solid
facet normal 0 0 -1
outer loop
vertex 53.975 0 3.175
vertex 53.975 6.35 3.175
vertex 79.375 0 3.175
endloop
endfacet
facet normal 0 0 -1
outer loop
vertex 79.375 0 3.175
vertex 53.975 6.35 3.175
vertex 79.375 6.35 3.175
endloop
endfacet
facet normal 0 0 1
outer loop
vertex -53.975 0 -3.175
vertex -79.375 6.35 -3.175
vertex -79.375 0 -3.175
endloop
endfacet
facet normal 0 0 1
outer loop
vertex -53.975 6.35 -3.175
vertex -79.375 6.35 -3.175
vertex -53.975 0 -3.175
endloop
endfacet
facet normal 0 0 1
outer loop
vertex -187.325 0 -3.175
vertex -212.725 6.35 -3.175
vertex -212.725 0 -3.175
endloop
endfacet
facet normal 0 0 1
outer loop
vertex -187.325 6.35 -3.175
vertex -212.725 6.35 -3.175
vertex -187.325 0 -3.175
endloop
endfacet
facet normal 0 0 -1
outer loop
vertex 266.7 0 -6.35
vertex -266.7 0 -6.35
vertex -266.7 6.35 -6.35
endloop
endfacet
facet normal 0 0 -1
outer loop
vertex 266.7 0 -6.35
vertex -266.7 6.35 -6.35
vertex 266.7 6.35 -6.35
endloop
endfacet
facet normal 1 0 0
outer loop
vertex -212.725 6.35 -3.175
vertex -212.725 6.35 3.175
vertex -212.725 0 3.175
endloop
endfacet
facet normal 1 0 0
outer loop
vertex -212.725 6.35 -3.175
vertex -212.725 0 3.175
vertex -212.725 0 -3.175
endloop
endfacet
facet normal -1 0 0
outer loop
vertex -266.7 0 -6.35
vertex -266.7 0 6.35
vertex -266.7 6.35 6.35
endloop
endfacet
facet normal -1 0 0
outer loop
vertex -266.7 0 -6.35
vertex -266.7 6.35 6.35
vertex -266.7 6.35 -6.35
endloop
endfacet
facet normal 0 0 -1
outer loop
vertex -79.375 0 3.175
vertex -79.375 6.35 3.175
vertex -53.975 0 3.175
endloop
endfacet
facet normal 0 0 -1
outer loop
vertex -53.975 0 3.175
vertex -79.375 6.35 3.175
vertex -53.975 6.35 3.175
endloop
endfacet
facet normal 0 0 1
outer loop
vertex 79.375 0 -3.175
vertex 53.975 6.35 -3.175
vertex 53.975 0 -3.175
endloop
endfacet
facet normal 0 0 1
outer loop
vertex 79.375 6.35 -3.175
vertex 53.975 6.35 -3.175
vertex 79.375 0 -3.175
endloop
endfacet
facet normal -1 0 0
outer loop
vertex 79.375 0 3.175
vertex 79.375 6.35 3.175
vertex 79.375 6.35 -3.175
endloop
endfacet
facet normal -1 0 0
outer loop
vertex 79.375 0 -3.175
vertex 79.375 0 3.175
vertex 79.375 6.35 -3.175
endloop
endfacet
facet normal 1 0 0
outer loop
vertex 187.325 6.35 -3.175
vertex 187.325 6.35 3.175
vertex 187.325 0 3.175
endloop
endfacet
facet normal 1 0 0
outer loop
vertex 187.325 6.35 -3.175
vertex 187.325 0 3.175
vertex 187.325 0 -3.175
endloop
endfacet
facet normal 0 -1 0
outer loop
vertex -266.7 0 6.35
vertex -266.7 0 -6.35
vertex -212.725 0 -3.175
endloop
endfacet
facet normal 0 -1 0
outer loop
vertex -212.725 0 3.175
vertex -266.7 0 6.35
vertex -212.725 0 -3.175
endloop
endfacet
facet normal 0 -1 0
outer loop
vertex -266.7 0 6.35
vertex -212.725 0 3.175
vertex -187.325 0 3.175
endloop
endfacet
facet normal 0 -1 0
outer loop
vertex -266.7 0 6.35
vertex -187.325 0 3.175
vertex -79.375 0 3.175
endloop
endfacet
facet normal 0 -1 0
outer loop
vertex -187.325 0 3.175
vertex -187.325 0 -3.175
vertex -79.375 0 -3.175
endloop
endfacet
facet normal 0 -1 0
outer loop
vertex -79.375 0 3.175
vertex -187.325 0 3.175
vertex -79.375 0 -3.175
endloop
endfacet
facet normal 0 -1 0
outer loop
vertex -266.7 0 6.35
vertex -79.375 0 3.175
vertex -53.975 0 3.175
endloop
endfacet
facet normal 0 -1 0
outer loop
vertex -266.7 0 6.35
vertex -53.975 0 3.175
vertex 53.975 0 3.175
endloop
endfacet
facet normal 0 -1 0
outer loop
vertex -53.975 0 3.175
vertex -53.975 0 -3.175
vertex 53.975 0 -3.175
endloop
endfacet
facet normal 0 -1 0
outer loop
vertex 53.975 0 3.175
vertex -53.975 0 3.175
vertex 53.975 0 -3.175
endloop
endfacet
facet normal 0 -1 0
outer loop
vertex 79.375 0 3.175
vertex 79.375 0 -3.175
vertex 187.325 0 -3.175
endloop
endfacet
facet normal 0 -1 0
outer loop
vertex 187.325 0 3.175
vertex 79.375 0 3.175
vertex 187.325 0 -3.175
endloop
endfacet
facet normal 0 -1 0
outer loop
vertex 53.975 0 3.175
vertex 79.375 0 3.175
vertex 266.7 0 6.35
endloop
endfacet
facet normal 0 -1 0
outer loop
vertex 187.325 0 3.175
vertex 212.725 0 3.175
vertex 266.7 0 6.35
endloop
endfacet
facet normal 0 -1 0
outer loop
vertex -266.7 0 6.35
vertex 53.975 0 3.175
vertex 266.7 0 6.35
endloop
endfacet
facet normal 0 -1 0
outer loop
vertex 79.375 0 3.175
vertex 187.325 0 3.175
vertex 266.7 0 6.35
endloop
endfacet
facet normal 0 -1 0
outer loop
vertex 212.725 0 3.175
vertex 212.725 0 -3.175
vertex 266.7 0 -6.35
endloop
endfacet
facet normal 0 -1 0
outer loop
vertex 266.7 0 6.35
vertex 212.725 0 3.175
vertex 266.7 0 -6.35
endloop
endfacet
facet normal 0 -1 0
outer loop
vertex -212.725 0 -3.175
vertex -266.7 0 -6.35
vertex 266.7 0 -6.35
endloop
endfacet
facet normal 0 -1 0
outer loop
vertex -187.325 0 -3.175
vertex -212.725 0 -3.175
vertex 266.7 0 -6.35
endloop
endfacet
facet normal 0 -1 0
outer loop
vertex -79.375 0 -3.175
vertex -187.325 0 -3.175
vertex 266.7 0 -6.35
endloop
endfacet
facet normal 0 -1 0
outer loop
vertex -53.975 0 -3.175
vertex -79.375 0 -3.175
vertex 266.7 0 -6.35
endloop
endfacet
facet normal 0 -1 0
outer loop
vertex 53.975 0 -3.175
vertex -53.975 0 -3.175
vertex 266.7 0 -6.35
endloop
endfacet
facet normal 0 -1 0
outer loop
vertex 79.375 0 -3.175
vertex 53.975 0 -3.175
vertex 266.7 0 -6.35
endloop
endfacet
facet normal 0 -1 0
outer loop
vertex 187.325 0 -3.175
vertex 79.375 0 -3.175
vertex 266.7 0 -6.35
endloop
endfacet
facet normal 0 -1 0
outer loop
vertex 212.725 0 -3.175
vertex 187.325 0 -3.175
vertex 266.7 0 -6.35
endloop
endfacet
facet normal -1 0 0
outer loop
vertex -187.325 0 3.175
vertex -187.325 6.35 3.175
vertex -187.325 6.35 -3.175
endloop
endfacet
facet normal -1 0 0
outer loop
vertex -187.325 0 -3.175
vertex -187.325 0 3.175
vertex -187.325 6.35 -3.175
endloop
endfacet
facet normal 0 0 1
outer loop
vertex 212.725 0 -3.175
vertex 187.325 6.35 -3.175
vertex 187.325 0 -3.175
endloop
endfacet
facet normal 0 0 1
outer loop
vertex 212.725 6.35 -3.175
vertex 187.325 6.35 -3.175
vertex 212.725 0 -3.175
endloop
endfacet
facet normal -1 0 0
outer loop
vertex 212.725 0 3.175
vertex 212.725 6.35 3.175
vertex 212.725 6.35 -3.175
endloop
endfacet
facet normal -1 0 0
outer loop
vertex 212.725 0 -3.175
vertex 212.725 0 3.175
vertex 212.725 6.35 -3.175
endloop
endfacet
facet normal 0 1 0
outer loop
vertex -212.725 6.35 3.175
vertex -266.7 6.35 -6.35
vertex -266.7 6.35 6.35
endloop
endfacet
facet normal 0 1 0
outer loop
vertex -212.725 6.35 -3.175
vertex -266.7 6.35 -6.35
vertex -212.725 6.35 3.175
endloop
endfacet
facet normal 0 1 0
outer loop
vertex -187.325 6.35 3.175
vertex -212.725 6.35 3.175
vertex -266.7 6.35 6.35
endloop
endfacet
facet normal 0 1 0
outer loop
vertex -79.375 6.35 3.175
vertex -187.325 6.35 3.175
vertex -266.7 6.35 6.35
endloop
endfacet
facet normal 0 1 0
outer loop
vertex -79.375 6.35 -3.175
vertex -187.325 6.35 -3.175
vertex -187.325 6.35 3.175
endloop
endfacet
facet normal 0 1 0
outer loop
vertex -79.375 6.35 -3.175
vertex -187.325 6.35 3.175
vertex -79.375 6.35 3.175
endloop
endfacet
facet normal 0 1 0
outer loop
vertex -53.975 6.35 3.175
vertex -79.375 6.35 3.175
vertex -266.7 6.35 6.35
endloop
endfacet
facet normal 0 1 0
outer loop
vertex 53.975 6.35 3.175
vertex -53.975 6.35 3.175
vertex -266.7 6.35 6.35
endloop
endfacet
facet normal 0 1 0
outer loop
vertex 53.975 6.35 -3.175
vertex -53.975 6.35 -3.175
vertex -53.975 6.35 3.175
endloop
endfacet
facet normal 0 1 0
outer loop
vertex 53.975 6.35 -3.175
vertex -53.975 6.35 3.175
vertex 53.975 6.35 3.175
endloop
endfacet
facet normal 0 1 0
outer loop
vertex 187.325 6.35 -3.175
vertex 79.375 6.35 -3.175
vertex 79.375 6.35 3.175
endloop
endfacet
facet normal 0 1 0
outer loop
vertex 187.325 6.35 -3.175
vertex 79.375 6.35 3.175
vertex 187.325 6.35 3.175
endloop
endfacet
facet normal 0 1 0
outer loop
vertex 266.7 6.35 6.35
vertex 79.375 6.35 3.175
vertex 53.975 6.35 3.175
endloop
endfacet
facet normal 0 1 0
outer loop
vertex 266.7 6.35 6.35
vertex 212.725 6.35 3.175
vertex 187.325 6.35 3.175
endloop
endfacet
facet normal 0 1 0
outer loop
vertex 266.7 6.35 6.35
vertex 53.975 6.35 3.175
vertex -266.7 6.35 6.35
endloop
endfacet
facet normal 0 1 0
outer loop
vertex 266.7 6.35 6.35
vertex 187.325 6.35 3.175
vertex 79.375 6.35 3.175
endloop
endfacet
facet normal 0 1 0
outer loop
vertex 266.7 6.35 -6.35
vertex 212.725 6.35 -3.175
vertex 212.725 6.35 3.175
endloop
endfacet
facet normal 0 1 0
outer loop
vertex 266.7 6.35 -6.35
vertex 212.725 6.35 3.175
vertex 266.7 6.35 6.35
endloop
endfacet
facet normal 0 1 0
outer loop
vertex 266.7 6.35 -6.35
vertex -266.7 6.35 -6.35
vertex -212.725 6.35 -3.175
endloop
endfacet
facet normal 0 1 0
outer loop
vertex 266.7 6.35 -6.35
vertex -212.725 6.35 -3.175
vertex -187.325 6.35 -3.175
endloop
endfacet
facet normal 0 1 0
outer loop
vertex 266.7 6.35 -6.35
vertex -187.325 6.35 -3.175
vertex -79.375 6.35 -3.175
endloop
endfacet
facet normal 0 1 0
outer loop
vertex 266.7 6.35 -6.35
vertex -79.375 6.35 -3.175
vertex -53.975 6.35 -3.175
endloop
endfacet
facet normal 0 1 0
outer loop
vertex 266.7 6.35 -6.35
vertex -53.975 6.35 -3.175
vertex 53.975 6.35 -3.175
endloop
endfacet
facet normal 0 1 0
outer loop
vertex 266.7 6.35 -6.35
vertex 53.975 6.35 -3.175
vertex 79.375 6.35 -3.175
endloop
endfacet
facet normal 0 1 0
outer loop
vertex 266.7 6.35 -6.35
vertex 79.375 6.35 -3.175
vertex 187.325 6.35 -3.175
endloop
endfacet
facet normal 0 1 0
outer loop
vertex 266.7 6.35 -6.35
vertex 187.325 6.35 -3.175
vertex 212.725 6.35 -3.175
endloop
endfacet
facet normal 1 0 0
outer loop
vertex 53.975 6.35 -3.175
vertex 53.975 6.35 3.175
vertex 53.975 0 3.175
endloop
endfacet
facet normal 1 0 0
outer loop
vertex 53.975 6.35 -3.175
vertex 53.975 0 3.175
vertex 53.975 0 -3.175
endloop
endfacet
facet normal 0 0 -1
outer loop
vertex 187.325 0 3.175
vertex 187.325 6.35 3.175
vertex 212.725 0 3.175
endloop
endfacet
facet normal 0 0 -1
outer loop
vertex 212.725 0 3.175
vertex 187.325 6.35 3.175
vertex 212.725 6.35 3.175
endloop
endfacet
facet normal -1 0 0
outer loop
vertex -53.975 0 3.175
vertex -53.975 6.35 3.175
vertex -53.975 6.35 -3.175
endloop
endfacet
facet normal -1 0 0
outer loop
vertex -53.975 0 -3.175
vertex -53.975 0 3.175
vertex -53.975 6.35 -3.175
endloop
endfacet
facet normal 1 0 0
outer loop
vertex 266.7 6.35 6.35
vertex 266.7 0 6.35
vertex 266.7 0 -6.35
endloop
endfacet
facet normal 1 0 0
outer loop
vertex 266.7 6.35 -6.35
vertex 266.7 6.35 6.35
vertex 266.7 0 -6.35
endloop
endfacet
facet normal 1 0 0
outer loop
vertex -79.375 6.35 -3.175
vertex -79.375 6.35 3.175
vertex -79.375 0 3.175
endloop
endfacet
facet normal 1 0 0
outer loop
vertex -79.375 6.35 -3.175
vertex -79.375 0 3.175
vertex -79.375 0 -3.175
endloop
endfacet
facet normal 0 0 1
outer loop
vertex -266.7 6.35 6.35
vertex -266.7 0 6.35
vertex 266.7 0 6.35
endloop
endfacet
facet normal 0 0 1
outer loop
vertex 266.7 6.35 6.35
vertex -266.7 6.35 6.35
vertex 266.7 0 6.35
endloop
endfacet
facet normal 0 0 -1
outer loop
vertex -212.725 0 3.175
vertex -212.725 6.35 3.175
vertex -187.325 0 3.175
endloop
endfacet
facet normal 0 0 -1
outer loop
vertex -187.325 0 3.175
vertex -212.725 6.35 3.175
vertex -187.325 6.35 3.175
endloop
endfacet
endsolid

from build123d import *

# Parameters (mm, degrees)
SKETCH1_W           = 533.4
SKETCH1_H           = 12.7
BOSS_EXTRUDE1_DEPTH = 6.35
SKETCH2_W           = 25.4
SKETCH2_H           = 6.35
CUT_EXTRUDE1_DEPTH  = 7.35
LPATTERN1_COUNT     = 4
LPATTERN1_PITCH     = 133.35


with BuildPart() as part:
    # Sketch1 → Boss-Extrude1 (new body)
    with BuildSketch(Plane(origin=(0, 0, 0), x_dir=(1, 0, 0), z_dir=(0, 1, 0))):
        Rectangle(SKETCH1_W, SKETCH1_H)
    extrude(amount=BOSS_EXTRUDE1_DEPTH)

    # Sketch2 → Cut-Extrude1 (cut, through all)
    with BuildSketch(Plane(origin=(0, 6.35, 0), x_dir=(1, 0, 0), z_dir=(0, 1, 0))):
        with Locations((-200.025, 0)):
            Rectangle(SKETCH2_W, SKETCH2_H)
    cut_extrude1 = extrude(amount=-CUT_EXTRUDE1_DEPTH, mode=Mode.SUBTRACT)

    # LPattern1: Cut-Extrude1 ×4
    with Locations(*[(i * LPATTERN1_PITCH, 0, 0) for i in range(1, LPATTERN1_COUNT)]):
        add(cut_extrude1, mode=Mode.SUBTRACT)


solid = part.part
